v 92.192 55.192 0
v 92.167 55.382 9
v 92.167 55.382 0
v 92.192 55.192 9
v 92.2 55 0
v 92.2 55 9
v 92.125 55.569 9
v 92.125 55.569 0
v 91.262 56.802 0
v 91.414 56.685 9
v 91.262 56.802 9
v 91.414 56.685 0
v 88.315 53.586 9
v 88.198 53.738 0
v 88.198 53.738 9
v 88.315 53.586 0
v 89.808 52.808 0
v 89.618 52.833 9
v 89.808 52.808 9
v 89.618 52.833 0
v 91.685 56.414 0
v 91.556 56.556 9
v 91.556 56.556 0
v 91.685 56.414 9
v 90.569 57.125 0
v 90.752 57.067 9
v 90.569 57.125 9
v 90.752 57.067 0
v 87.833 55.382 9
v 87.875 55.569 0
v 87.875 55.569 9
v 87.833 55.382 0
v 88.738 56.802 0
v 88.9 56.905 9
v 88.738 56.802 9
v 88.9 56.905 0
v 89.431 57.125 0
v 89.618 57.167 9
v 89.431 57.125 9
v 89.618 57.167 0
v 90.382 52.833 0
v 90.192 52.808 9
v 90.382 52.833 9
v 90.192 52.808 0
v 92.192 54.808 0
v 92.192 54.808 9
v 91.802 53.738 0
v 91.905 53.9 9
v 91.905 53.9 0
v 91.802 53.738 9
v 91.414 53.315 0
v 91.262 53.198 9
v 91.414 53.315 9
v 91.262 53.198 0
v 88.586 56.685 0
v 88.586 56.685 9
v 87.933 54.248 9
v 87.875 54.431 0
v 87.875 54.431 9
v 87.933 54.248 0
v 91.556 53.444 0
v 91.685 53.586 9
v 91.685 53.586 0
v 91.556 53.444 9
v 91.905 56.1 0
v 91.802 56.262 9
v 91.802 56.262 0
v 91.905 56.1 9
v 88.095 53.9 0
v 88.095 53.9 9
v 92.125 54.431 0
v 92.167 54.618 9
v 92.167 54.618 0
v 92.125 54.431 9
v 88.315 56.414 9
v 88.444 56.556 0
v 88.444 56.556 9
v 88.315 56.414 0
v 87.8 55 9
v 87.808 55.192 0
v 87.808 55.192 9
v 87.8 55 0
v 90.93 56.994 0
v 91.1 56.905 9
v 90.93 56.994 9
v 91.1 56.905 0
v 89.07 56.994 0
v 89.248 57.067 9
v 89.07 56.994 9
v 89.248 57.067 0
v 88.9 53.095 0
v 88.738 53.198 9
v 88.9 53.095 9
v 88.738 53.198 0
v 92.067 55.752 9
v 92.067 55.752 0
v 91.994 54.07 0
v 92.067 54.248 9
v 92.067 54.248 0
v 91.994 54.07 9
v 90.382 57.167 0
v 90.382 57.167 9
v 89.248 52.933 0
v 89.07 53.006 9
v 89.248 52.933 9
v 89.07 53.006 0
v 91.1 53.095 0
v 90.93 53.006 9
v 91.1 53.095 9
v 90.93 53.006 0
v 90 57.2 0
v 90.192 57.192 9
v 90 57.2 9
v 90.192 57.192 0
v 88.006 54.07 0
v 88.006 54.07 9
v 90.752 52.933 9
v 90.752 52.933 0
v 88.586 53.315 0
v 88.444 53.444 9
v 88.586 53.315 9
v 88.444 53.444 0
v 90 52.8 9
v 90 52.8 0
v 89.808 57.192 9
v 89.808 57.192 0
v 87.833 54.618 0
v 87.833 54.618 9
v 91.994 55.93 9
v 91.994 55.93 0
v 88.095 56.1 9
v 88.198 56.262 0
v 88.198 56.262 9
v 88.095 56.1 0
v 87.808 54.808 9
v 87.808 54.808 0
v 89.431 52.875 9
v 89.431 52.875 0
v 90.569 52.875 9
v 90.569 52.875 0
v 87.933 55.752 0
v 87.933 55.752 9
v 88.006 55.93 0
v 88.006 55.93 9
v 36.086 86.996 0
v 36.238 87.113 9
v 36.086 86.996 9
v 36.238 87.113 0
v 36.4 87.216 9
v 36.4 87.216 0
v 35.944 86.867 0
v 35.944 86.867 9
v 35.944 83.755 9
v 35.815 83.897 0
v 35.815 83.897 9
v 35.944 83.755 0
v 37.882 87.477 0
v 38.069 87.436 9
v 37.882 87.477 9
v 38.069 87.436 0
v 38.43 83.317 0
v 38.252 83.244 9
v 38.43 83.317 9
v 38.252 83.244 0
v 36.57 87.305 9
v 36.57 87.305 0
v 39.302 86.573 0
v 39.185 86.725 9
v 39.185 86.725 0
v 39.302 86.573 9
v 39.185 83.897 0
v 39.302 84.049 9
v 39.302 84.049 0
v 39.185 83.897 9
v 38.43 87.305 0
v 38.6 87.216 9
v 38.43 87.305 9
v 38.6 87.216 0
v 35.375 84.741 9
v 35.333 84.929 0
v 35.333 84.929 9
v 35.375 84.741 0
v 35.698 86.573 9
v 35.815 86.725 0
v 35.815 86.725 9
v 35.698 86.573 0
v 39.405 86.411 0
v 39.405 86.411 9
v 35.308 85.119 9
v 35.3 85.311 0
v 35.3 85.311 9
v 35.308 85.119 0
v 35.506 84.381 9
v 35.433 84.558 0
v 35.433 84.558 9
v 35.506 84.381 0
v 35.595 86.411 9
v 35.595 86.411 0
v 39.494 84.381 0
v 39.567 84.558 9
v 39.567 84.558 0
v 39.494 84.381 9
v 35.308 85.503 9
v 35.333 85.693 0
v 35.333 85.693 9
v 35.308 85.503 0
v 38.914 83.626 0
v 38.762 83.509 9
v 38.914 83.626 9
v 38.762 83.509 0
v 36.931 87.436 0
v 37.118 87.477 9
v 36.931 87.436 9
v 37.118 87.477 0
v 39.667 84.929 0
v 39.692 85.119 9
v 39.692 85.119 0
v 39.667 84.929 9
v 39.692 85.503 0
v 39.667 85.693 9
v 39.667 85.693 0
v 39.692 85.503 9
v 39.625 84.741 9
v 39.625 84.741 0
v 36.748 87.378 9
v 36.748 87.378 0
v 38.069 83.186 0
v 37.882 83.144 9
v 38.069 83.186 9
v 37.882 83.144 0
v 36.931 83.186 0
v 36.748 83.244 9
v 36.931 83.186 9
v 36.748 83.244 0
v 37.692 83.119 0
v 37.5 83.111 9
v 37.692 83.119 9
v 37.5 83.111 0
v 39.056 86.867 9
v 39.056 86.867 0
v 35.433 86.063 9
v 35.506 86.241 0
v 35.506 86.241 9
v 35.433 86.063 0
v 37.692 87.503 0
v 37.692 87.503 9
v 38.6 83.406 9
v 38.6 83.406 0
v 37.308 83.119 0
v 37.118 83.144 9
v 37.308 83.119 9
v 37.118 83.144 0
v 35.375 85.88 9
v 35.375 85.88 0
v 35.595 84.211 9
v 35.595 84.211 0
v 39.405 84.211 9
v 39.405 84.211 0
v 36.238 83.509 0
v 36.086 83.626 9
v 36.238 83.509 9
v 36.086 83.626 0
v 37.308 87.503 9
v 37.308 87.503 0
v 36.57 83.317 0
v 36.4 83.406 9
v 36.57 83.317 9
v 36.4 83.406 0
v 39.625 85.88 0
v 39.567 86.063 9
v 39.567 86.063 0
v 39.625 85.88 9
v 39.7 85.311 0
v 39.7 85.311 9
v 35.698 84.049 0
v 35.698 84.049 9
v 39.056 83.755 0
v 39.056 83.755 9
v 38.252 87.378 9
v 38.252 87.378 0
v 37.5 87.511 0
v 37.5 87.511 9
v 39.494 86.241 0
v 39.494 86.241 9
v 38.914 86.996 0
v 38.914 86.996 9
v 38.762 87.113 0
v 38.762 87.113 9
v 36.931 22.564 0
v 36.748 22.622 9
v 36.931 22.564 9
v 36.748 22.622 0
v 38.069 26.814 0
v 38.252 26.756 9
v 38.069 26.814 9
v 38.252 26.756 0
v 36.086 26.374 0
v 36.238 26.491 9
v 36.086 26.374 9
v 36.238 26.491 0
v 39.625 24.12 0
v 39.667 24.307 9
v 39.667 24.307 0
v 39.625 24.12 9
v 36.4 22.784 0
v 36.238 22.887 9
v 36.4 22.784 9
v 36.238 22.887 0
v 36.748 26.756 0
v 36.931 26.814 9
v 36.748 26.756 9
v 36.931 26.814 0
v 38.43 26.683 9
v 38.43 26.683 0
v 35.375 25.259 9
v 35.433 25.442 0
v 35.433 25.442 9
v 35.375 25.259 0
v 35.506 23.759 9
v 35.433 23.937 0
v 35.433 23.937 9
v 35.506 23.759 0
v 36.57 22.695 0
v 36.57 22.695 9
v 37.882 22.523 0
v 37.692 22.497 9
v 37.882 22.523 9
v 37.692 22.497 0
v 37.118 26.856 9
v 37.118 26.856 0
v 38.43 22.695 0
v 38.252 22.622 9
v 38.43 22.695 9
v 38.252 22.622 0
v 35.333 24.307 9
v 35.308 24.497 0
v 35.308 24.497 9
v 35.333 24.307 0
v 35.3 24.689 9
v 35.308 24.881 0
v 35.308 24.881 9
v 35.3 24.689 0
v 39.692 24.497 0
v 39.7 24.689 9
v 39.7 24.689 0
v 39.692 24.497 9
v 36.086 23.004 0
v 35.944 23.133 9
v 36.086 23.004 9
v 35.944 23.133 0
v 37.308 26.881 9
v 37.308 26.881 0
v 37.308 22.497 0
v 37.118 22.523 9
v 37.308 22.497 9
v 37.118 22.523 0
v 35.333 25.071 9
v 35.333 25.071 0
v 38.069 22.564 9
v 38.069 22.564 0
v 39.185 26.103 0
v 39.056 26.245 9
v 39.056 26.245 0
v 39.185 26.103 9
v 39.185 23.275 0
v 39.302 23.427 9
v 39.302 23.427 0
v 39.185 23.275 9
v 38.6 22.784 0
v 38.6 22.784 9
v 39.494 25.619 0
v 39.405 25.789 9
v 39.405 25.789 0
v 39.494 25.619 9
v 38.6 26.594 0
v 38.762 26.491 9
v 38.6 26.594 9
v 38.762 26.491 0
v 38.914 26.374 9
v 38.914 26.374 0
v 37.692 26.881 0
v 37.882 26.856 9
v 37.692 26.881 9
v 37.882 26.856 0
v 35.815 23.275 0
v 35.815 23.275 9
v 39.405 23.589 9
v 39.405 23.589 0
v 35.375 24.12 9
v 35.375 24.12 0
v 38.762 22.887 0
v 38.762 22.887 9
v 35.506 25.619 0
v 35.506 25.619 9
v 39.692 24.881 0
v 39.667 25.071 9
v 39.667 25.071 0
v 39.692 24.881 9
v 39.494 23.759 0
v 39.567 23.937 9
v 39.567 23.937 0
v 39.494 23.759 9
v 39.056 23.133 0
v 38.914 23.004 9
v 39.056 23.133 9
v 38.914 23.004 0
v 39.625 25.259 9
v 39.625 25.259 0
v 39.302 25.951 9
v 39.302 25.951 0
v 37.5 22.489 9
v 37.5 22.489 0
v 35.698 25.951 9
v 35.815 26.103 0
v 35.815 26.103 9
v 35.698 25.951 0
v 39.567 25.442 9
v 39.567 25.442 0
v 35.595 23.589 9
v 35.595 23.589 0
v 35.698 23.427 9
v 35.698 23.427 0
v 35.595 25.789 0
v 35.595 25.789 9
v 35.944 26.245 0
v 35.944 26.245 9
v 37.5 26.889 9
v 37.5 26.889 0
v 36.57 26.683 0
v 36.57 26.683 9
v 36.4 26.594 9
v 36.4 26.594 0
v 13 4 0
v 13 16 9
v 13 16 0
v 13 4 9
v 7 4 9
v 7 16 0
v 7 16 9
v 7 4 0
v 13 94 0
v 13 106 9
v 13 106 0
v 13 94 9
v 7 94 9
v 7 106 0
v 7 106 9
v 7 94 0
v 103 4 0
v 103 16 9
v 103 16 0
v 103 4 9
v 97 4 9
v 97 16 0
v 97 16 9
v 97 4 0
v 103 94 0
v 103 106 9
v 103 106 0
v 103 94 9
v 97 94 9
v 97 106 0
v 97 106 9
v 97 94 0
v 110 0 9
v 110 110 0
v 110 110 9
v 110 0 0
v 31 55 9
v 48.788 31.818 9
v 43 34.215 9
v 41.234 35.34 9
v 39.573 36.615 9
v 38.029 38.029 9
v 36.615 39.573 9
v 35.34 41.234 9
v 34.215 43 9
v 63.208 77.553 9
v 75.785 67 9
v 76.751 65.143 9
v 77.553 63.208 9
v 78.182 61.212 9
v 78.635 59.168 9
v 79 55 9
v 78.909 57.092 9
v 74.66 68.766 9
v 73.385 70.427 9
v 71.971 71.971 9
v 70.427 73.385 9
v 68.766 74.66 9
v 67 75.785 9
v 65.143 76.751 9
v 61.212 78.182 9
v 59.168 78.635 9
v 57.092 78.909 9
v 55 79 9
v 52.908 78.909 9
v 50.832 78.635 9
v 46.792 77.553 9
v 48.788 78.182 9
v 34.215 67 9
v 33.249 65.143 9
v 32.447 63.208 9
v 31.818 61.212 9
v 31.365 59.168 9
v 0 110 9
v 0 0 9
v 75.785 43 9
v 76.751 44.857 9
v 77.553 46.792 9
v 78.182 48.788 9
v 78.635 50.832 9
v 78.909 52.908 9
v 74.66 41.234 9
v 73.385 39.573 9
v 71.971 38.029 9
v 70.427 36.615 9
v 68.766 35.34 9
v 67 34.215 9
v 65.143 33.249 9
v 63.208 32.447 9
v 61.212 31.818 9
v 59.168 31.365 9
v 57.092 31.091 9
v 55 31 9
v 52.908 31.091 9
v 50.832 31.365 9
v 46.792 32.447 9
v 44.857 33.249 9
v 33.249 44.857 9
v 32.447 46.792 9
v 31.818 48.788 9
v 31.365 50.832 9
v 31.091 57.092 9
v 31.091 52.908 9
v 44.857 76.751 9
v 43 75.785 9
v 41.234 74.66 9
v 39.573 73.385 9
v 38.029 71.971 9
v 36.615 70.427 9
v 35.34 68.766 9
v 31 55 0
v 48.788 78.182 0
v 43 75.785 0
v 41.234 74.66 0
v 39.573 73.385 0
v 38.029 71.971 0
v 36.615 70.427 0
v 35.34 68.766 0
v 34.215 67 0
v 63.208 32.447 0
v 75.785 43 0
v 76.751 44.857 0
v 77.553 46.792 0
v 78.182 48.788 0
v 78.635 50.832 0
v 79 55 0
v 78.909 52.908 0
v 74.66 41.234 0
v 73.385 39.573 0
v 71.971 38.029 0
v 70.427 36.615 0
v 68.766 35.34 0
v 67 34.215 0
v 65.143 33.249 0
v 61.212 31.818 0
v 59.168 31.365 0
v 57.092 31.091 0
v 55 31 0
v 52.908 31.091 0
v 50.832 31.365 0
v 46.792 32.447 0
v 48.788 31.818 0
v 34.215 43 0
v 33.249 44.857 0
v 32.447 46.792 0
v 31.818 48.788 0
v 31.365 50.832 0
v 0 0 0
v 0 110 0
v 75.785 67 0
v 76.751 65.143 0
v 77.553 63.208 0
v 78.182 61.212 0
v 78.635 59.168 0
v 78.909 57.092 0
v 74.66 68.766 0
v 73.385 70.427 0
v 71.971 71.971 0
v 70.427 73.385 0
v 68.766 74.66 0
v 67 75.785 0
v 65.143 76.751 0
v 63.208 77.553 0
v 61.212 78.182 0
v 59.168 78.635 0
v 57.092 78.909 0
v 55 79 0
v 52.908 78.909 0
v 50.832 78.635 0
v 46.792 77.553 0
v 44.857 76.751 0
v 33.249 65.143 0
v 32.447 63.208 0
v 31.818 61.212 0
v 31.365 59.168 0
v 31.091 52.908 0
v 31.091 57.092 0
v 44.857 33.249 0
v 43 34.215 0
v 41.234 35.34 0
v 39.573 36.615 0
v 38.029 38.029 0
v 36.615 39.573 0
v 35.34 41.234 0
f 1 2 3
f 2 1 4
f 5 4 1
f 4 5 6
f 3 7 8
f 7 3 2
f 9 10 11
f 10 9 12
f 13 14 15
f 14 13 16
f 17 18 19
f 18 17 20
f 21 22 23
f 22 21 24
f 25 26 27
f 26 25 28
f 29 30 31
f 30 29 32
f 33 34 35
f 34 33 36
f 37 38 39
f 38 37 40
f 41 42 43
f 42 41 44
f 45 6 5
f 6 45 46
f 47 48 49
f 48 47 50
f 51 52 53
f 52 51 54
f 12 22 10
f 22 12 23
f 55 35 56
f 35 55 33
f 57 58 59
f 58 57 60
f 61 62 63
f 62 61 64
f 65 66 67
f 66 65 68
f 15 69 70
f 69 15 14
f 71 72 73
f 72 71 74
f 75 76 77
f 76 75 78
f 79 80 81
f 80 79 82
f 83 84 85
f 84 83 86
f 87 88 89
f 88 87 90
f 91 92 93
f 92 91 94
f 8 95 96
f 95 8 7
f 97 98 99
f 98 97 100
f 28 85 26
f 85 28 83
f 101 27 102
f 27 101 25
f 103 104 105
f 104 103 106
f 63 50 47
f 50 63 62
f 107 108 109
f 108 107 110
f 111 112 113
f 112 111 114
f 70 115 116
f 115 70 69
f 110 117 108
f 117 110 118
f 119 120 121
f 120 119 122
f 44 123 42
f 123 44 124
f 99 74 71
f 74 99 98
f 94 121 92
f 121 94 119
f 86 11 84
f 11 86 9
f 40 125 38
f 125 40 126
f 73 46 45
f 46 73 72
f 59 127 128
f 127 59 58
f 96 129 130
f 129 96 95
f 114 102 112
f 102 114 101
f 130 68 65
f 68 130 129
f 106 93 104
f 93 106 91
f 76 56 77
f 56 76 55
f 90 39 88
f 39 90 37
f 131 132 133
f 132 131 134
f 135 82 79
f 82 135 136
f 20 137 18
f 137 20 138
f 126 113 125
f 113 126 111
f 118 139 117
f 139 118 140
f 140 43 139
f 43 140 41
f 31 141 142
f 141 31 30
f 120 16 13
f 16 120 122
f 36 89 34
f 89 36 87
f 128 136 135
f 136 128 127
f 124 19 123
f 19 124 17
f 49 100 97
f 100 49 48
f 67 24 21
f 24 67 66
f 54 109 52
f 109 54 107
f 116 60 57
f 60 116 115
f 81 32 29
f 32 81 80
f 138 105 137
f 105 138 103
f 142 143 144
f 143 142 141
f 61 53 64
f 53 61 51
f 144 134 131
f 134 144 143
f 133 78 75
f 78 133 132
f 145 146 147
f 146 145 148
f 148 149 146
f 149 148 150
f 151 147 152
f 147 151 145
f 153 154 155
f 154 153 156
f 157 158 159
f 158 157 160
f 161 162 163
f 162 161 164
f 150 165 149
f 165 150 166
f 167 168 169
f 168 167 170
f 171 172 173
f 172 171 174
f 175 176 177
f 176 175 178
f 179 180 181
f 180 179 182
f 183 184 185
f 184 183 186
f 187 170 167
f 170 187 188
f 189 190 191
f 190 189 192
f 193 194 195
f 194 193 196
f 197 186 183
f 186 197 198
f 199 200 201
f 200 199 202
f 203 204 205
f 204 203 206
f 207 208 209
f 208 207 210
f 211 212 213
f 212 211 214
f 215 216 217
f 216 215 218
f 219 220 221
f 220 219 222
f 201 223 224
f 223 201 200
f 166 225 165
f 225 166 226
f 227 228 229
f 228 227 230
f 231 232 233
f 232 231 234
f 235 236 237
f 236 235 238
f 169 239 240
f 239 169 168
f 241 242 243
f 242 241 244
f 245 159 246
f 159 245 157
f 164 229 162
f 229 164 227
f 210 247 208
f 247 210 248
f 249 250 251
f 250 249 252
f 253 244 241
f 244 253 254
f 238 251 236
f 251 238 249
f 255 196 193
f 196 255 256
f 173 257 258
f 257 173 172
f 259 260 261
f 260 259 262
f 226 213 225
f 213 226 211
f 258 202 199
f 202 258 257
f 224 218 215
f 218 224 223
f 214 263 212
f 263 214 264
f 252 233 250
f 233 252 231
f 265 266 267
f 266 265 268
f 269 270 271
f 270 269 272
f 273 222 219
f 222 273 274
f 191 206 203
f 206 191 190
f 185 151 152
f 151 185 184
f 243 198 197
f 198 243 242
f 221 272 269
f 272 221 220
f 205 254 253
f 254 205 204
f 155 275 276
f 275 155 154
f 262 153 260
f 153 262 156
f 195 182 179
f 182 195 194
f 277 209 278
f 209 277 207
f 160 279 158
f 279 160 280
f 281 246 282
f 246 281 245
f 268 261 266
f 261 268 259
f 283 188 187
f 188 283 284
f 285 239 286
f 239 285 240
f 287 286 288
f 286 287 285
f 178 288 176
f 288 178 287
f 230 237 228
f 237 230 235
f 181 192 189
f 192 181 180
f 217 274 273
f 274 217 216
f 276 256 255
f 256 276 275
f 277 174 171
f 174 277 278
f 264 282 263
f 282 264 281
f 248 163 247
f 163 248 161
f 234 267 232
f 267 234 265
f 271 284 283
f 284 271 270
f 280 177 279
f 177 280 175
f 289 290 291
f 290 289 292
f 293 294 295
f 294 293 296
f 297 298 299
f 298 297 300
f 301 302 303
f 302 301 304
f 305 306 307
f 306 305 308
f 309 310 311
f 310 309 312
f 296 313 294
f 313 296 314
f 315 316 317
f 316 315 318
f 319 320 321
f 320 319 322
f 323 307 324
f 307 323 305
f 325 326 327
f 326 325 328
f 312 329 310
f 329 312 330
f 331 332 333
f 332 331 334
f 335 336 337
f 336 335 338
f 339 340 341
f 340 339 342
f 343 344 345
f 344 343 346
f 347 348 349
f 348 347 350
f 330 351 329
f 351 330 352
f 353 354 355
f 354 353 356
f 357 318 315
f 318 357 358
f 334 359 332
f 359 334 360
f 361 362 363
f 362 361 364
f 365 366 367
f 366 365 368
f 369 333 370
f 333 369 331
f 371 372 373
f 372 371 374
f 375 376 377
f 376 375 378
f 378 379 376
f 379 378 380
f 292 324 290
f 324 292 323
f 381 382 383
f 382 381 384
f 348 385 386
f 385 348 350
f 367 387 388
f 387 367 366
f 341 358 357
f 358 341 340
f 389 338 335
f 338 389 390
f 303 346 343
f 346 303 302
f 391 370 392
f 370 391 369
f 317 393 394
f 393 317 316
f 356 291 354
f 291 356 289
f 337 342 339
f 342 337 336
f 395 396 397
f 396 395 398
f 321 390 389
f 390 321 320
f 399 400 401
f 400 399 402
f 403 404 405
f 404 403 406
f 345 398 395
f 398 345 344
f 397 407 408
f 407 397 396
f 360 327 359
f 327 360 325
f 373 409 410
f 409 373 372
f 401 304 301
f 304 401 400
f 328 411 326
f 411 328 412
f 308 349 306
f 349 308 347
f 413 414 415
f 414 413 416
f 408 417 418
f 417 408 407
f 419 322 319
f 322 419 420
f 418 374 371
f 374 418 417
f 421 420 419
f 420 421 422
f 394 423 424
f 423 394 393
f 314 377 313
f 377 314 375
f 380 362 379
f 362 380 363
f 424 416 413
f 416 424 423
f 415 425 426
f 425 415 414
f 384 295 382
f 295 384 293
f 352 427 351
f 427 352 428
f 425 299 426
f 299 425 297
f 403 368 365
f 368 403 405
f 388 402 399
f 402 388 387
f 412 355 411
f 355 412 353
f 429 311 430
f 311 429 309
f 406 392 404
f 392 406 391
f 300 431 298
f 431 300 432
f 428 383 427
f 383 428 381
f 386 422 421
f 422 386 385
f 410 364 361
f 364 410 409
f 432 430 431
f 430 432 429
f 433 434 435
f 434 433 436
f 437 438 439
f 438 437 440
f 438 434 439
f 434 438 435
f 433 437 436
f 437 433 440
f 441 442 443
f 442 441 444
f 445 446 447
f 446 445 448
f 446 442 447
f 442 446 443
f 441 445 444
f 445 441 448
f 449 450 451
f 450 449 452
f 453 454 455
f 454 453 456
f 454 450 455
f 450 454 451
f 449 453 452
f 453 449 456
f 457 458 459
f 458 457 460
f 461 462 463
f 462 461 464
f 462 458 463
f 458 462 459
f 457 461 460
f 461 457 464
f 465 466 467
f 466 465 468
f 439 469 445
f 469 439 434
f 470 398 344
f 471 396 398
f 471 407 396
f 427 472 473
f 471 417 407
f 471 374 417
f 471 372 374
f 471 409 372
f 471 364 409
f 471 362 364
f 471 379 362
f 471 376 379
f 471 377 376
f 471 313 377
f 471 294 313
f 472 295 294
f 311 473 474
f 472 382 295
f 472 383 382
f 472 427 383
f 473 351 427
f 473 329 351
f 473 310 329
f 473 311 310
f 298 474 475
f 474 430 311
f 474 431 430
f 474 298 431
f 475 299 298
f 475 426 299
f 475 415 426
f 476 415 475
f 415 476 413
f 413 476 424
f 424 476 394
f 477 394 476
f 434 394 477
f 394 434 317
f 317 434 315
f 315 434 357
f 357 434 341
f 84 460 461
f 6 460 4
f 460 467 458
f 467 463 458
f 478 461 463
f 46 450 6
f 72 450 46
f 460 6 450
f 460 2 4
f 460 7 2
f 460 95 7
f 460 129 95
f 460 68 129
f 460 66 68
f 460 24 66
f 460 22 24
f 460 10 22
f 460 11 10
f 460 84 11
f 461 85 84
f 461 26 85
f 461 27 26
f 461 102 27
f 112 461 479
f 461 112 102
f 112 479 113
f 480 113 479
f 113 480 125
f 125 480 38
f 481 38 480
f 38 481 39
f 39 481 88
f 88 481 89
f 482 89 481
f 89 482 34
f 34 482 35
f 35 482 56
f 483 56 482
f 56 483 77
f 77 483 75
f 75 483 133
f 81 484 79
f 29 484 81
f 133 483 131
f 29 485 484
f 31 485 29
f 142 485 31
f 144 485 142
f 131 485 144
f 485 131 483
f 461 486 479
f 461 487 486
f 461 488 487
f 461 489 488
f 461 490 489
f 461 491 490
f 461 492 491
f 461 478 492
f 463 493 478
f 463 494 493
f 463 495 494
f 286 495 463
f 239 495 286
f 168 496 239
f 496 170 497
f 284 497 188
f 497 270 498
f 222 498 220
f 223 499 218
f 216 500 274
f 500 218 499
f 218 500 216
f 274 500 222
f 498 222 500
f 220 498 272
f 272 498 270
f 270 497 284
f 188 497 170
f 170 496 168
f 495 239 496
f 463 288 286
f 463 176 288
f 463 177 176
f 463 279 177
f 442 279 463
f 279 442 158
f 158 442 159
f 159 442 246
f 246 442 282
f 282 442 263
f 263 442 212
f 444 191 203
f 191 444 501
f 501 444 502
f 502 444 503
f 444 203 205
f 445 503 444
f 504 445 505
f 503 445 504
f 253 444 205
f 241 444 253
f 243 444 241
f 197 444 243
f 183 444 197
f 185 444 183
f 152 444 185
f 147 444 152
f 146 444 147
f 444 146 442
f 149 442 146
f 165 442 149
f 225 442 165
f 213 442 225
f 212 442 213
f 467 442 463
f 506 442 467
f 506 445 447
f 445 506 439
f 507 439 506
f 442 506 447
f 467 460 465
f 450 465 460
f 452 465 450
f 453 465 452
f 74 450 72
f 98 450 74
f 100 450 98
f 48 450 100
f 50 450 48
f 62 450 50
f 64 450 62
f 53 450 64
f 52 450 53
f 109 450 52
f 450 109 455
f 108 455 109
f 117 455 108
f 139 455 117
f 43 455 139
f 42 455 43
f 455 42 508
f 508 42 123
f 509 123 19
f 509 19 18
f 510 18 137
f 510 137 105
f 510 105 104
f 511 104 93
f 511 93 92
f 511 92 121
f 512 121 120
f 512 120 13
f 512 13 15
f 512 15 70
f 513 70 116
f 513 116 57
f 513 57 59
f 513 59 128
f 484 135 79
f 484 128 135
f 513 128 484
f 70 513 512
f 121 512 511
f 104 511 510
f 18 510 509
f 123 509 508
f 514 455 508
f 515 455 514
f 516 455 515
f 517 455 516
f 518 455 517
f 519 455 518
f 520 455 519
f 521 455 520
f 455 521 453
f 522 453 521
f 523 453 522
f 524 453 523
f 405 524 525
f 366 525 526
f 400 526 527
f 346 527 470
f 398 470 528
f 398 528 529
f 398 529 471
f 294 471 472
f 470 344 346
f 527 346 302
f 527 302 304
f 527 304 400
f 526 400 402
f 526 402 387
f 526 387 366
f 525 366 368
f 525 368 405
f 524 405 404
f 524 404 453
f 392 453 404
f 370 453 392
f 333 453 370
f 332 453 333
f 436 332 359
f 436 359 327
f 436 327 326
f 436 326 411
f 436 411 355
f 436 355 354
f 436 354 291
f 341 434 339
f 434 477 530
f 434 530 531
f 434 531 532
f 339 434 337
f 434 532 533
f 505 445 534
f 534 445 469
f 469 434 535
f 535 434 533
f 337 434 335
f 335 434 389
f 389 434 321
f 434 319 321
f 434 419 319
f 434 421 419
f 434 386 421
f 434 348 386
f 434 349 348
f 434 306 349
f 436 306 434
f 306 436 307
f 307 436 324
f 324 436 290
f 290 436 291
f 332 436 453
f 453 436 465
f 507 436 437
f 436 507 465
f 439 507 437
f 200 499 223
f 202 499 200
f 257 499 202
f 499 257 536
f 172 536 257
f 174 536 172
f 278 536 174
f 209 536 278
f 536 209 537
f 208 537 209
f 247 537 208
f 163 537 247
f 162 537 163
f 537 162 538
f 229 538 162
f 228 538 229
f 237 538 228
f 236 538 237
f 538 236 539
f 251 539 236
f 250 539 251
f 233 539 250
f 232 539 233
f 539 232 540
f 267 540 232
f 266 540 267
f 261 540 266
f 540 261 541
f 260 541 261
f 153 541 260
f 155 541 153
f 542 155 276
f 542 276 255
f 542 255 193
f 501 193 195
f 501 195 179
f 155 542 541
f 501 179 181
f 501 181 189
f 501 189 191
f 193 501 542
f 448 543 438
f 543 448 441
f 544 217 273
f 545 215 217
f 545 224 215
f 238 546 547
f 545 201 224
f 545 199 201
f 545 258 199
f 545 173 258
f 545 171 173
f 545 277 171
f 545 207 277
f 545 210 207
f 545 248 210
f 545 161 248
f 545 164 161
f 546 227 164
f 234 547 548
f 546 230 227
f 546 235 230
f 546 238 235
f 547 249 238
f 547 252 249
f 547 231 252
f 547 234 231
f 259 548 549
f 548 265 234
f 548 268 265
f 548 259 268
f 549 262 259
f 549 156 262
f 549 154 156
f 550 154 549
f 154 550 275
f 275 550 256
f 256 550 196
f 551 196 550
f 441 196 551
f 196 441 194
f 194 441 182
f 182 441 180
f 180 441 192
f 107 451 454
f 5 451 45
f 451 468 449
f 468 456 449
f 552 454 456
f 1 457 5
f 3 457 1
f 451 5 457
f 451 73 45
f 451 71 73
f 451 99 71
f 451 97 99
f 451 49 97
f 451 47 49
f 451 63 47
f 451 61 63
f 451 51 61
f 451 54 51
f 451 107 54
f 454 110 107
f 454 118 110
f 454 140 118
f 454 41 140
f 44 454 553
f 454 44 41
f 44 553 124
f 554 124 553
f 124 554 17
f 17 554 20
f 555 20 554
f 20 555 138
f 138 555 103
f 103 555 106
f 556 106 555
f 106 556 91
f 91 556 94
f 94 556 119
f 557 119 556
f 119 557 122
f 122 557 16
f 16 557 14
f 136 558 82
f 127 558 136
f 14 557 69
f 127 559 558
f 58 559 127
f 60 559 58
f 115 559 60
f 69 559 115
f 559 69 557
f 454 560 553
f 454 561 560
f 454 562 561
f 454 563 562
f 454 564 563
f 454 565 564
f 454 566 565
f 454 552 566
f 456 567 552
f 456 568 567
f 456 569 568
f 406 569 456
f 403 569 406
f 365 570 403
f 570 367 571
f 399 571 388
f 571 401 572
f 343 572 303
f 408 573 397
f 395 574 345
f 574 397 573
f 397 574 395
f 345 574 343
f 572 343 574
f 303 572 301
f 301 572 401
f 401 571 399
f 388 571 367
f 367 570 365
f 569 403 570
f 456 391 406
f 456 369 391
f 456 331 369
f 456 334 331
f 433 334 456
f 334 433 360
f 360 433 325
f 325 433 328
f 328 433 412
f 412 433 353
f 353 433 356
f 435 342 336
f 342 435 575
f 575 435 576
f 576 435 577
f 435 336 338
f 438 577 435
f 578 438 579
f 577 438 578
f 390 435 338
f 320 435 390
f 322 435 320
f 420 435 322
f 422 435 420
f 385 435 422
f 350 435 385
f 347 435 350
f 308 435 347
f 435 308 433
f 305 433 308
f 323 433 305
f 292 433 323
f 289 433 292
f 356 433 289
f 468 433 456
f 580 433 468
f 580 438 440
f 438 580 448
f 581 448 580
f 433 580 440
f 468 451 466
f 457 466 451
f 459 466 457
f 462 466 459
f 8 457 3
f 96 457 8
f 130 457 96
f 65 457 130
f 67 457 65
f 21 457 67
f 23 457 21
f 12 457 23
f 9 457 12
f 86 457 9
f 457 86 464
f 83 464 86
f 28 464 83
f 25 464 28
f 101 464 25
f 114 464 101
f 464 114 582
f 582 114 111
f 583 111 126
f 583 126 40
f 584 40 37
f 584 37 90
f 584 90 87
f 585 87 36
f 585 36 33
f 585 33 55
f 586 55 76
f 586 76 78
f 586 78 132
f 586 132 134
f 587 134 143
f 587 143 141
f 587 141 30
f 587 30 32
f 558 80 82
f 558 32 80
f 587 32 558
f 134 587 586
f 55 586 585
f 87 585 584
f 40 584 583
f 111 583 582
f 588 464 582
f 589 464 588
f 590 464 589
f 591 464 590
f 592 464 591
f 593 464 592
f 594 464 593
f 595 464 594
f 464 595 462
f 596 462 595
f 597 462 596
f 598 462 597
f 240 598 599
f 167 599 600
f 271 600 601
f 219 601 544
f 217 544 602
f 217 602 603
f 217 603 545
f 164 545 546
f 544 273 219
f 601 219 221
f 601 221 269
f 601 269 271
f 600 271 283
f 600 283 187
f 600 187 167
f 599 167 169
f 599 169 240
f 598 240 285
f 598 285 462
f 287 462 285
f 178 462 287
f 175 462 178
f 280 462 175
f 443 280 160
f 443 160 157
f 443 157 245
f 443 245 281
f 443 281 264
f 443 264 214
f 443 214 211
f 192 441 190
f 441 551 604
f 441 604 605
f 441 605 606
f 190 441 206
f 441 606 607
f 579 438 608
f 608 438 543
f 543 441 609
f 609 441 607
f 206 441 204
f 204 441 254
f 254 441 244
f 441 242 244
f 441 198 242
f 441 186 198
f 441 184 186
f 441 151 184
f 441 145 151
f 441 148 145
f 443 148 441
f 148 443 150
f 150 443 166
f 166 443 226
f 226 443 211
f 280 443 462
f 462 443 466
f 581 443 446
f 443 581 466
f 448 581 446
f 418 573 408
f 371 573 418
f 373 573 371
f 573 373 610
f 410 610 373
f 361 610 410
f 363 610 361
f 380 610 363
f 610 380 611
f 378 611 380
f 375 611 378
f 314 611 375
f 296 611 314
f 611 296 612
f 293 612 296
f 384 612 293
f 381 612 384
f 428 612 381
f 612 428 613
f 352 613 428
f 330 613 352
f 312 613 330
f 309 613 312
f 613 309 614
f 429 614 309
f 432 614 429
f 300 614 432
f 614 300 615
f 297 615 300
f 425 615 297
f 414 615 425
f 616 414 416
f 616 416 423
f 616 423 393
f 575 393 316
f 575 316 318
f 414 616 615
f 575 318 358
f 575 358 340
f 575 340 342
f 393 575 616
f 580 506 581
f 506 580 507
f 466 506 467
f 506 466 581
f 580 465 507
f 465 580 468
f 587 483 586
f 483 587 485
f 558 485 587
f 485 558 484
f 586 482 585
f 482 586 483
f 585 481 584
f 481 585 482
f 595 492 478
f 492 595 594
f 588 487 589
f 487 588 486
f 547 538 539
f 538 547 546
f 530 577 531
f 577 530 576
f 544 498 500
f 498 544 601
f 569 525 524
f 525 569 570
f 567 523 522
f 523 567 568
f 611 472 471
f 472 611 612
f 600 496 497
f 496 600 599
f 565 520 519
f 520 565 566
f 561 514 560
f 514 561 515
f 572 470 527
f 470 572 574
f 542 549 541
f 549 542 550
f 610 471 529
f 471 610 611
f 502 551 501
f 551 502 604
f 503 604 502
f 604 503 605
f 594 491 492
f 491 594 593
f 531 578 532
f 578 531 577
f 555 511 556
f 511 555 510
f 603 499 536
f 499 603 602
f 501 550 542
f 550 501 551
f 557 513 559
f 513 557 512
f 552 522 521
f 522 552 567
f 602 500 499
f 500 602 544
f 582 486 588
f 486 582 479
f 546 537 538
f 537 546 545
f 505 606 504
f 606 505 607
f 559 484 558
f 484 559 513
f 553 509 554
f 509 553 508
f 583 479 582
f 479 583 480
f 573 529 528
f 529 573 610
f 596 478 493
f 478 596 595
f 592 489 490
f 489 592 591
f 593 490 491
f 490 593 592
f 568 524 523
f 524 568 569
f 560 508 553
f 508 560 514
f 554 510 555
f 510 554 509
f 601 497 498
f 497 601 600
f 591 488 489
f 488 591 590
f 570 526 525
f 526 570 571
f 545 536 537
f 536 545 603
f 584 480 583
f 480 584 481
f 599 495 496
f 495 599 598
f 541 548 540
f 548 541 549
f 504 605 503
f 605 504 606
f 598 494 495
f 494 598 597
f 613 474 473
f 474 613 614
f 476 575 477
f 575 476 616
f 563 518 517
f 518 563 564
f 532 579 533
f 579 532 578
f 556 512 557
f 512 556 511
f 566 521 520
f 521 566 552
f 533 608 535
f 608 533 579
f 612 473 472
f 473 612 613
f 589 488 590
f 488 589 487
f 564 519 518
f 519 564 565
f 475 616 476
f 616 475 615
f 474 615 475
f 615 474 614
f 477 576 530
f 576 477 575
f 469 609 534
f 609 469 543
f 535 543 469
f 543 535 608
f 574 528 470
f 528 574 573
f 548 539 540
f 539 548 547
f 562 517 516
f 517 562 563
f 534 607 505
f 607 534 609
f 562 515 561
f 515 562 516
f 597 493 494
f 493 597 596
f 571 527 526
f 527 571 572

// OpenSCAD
// Husqvarna Automower 440 iQ / P16 platform cutting-module motor housing frame
// OEM: 599 31 82-01 (599318201) — IPL ref 15 on 405X/415X/440 iQ blade motor diagram
//
// Packaging reference (retailer data): ~110 x 110 x 9 mm, 25 g
// Calibrate all dimensions against your OEM part before printing for fit.

$fn = 72;

// --- Plate envelope (mm) ---
plate_size   = 110;
plate_thick  = 9;

// --- Central motor bore ---
motor_bore_d = 48;

// --- Blade-disc screw pattern (3x M4, 590 50 87-01) ---
disc_screw_count = 3;
disc_screw_pcd   = 35;
disc_screw_d     = 4.4;   // clearance for M4

// --- Corner mounting slots (adjust to match your chassis) ---
corner_slot_len = 12;
corner_slot_w   = 6;
corner_inset    = 10;

// --- Optional modification pads (set true to add mounting ears) ---
enable_mod_ears = false;
mod_ear_w       = 20;
mod_ear_h       = 8;
mod_ear_thick   = 3;

module corner_slots() {
    inset = corner_inset;
    for (xy = [
        [ inset,  inset],
        [ inset,  plate_size - inset],
        [ plate_size - inset, inset],
        [ plate_size - inset, plate_size - inset]
    ]) {
        translate([xy[0] - corner_slot_w/2, xy[1] - corner_slot_len/2, -0.1])
            cube([corner_slot_w, corner_slot_len, plate_thick + 0.2]);
    }
}

module disc_screw_holes() {
    for (i = [0 : disc_screw_count - 1]) {
        rotate([0, 0, i * 360 / disc_screw_count])
            translate([disc_screw_pcd, 0, -0.1])
                cylinder(h = plate_thick + 0.2, d = disc_screw_d);
    }
}

module mod_ears() {
    if (enable_mod_ears) {
        for (x = [0, plate_size - mod_ear_w])
            translate([x, plate_size/2 - mod_ear_h/2, plate_thick])
                cube([mod_ear_w, mod_ear_h, mod_ear_thick]);
    }
}

difference() {
    union() {
        cube([plate_size, plate_size, plate_thick]);
        mod_ears();
    }
    translate([plate_size/2, plate_size/2, -0.1])
        cylinder(h = plate_thick + 0.2, d = motor_bore_d);
    translate([plate_size/2, plate_size/2, 0])
        disc_screw_holes();
    corner_slots();
}
